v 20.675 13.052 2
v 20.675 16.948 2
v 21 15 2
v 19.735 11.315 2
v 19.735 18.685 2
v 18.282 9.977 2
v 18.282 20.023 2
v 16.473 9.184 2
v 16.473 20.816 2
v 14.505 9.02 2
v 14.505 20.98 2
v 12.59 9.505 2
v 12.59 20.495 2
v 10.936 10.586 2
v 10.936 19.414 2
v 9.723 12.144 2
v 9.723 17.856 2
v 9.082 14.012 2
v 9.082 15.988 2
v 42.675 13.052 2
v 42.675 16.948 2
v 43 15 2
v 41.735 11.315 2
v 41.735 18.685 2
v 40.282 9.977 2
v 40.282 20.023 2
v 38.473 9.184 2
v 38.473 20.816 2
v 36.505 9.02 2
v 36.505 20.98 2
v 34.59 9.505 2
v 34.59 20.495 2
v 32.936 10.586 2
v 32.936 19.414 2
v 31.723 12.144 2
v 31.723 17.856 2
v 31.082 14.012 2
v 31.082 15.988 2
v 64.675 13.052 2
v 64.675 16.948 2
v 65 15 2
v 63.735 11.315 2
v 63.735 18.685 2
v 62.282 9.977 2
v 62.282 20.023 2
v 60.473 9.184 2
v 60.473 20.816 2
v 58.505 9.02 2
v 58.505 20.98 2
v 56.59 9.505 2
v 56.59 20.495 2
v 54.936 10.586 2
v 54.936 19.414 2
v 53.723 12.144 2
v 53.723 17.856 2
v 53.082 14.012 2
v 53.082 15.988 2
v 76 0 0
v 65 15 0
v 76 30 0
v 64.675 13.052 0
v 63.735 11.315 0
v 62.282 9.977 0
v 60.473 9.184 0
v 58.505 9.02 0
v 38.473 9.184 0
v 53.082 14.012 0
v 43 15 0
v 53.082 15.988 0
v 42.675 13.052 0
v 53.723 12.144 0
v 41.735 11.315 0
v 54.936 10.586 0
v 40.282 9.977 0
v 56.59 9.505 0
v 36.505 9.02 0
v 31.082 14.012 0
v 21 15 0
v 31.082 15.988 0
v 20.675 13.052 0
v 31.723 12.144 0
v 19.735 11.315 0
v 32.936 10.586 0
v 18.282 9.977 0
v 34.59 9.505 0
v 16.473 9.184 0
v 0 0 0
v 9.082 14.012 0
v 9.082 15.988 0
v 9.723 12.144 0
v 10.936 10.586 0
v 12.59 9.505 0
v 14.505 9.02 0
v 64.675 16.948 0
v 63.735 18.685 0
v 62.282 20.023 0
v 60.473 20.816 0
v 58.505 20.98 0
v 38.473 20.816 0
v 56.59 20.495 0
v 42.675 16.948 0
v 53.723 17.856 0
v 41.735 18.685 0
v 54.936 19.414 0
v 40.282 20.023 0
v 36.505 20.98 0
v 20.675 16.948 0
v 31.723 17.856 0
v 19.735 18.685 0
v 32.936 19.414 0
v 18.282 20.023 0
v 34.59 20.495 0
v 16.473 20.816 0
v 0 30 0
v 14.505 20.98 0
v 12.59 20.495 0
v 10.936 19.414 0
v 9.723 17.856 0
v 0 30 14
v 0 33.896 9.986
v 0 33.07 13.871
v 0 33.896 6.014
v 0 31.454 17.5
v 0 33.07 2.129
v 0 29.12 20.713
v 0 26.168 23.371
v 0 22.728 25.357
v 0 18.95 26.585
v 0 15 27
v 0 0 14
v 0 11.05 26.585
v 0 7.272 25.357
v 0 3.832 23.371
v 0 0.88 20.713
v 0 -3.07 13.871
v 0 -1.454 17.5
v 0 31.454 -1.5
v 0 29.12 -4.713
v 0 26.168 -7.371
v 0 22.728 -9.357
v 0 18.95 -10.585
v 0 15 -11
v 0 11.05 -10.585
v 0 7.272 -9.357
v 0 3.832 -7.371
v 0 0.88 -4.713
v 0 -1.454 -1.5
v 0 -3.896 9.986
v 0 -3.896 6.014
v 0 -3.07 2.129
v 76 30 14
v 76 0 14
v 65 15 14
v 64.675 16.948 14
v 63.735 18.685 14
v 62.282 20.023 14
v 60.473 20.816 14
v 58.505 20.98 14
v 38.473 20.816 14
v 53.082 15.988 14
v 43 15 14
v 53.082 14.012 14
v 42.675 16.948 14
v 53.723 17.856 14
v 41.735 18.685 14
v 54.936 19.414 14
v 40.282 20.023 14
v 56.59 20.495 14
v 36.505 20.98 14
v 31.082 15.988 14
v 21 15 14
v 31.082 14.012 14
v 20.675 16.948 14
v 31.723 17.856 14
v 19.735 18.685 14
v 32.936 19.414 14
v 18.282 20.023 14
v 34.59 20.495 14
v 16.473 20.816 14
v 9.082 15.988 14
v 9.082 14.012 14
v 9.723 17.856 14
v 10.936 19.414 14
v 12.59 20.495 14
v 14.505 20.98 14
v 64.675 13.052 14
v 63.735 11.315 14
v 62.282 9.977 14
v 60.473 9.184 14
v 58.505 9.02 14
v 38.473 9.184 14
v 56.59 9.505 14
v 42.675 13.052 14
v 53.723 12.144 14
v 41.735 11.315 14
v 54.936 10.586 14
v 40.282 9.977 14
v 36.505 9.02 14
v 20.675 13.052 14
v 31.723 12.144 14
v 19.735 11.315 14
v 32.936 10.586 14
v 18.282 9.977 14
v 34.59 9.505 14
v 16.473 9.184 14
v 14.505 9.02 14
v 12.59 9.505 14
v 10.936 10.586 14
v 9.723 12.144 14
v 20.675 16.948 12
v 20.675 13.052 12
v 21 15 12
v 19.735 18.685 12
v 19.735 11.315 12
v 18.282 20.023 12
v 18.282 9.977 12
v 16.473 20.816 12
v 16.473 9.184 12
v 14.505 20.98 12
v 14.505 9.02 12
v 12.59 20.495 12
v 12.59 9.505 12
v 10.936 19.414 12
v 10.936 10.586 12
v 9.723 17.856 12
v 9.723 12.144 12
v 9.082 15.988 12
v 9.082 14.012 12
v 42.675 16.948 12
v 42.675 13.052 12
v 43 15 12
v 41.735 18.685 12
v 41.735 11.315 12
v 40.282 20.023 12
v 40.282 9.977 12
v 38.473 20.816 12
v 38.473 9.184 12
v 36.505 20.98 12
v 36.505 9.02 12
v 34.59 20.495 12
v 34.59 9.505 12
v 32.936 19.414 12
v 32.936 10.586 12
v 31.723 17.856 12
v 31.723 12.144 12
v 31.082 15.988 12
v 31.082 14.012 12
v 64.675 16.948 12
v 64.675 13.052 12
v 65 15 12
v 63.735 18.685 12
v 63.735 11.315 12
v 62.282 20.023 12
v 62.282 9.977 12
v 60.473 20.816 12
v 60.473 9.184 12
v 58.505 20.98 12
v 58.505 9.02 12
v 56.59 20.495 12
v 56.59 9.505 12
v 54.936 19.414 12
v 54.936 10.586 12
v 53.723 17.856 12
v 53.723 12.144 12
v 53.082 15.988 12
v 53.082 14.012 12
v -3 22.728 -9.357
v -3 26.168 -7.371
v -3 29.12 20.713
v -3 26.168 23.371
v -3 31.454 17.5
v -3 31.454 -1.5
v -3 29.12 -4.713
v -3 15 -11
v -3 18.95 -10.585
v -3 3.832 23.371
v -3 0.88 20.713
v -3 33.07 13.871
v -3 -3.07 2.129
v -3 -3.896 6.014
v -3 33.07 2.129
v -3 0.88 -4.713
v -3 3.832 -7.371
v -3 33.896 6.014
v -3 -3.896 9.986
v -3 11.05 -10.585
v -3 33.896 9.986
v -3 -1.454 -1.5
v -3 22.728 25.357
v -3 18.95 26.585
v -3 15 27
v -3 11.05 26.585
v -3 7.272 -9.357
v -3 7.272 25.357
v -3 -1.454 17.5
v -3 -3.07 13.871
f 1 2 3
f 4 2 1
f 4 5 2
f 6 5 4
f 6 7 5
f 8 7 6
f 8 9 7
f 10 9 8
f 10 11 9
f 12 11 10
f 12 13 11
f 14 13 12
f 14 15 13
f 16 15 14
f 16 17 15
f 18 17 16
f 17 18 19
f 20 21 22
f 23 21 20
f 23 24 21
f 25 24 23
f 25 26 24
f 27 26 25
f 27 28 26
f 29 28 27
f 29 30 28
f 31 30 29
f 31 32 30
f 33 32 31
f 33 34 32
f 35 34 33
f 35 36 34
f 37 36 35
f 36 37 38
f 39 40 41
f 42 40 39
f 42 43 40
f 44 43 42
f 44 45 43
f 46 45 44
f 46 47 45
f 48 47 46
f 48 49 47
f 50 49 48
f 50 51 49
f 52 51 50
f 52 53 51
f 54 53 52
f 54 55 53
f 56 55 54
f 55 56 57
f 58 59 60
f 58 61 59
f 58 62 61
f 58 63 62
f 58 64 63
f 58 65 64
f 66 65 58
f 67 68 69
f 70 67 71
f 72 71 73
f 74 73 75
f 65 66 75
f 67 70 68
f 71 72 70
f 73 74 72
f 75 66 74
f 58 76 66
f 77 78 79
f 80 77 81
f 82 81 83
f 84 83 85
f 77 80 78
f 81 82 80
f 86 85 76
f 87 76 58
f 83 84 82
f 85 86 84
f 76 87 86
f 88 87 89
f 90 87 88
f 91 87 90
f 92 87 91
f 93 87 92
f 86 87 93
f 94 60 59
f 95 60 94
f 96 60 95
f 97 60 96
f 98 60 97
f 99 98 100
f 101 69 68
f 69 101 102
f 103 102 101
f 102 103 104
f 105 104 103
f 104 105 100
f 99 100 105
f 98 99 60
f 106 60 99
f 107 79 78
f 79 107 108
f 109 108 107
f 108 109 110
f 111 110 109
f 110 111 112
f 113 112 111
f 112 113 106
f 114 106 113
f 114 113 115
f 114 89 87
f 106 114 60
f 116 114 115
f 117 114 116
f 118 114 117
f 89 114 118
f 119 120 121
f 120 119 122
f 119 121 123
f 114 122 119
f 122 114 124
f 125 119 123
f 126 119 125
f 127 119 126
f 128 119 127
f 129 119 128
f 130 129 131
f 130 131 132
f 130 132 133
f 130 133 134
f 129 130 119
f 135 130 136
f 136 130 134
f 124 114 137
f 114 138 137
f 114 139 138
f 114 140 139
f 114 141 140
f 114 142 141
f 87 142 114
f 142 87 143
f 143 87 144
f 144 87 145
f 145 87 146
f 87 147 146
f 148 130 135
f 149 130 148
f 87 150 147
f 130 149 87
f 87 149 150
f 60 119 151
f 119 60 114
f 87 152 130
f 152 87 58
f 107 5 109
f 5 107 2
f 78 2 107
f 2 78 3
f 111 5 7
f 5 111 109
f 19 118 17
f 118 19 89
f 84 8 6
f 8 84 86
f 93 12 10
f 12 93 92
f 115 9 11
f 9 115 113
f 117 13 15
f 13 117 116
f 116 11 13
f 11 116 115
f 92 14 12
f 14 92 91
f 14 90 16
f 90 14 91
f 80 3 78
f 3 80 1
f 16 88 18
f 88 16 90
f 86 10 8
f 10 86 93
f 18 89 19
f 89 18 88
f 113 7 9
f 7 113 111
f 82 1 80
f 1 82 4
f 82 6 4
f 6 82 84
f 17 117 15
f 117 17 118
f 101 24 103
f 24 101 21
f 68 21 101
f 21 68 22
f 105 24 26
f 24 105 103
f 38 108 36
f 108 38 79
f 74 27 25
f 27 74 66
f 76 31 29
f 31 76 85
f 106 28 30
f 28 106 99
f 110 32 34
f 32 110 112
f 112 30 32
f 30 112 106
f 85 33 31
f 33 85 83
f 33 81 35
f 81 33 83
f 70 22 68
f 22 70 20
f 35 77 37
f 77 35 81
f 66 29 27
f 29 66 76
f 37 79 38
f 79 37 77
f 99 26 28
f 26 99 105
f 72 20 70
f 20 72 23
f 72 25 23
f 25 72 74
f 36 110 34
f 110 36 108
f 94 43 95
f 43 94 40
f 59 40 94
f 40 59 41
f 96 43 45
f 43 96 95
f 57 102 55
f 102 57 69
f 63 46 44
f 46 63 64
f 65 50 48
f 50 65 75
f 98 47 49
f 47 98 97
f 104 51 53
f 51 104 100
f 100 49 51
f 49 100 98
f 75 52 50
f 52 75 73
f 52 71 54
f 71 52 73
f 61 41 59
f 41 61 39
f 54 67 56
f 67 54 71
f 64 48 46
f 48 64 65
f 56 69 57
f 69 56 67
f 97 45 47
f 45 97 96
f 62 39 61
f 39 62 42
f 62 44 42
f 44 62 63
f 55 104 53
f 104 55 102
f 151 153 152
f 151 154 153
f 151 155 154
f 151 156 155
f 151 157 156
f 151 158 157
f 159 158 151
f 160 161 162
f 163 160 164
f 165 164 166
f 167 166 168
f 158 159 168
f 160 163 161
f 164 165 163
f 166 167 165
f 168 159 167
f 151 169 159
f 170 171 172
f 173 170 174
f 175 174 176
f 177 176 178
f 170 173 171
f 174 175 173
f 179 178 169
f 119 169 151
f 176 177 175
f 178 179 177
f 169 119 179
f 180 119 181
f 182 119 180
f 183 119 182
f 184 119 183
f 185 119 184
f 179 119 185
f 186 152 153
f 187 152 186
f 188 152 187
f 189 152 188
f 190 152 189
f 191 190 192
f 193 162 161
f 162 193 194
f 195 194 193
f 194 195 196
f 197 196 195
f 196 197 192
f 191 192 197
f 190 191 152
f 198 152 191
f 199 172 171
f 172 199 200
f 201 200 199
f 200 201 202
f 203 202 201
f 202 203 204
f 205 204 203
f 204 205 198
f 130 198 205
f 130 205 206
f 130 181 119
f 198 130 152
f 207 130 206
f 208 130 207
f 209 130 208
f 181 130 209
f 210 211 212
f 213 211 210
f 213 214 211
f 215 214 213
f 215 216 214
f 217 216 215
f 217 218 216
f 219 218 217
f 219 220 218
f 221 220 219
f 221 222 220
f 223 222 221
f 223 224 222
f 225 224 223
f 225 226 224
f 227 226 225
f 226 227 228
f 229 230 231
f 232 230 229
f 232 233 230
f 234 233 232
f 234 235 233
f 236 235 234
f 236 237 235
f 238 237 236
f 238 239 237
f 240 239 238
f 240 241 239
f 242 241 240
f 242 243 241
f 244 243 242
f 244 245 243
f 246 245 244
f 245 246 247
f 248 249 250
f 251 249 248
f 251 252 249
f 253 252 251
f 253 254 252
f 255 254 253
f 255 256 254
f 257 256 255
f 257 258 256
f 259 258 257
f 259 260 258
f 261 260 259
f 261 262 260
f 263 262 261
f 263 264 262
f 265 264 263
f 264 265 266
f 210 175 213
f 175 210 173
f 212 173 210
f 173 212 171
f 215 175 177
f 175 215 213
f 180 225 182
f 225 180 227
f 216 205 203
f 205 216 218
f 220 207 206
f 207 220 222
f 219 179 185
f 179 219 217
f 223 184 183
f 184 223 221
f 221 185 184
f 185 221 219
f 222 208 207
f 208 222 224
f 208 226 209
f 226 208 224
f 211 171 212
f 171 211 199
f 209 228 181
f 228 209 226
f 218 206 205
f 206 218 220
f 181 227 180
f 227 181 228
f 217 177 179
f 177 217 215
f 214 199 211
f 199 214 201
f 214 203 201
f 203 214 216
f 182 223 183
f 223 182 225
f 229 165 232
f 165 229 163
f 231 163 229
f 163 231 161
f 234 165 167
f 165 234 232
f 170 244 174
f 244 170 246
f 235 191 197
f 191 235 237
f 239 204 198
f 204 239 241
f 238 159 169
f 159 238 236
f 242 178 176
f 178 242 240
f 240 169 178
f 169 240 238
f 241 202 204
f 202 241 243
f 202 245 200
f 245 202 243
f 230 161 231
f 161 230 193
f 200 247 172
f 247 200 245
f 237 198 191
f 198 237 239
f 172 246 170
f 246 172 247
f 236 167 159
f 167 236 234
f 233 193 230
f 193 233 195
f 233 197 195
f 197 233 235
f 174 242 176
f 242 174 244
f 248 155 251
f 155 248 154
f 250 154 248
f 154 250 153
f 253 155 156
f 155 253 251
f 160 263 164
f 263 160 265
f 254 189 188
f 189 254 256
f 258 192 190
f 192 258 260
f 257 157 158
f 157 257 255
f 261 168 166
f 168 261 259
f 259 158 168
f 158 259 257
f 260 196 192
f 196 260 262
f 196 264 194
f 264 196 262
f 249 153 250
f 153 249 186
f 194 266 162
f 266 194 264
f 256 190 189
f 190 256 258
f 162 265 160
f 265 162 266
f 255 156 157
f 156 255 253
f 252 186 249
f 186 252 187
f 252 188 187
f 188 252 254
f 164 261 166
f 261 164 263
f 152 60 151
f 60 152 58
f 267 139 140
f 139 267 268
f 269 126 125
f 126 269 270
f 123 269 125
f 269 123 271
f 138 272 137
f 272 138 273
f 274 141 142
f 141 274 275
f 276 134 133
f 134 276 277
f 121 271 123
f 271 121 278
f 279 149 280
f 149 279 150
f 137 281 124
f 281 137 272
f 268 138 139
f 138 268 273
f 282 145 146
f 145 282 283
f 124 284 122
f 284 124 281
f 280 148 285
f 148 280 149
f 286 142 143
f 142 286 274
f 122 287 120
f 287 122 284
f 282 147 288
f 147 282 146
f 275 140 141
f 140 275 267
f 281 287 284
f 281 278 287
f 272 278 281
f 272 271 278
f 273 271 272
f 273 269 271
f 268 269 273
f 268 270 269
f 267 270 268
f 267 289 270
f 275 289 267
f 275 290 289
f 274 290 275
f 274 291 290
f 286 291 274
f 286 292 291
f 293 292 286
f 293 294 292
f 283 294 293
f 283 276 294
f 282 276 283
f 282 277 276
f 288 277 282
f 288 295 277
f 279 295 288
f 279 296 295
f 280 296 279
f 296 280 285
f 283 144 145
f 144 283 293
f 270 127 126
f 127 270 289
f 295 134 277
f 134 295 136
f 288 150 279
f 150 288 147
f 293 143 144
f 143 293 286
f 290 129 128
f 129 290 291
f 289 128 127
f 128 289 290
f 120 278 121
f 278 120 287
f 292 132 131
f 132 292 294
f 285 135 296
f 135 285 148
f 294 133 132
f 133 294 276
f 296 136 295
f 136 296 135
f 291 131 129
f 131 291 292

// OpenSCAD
hole_radius = 6;
hole_diameter = hole_radius*2;
hole_distance = 10;
acrylic_thickness = 2;
foam_thickness = 10;
screwhole_radius = 2;
edge_distance = 5 + screwhole_radius * 2;
num_holes = 3;
ts_length = hole_diameter*num_holes + edge_distance*2 + hole_distance* (num_holes - 1);
ts_width = 2*edge_distance + hole_diameter;
rod_radius = 2;
gap = 10;
rod_length = 10;
motor_length = 36;
motor_width = 35;
motor_height = 35;
shaft_length = 22;
shaft_diam = 5;
prettify = 1;

module tubestrip(zpos=0) {
    translate([0,0,zpos]) difference () {
    cube([
        ts_length,
        ts_width,
        acrylic_thickness]);
    translate([hole_radius + edge_distance,
        hole_radius + edge_distance,
        -prettify]) cylinder(acrylic_thickness + 2*prettify, hole_radius, hole_radius, false); 
    translate([hole_radius + edge_distance + (hole_radius*2+hole_distance) * 1,
        hole_radius + edge_distance,
        -prettify]) cylinder(acrylic_thickness + 2*prettify, hole_radius, hole_radius, false); 
    translate([hole_radius + edge_distance + (hole_radius*2+hole_distance) * 2,
        hole_radius + edge_distance,
        -prettify]) cylinder(acrylic_thickness + 2*prettify, hole_radius, hole_radius, false);  
    }
}

color("white", alpha=0.5) tubestrip(zpos=0);
color("white", alpha=0.5) tubestrip(zpos=acrylic_thickness+foam_thickness);

// end plate for the two tube strips
color("white", alpha=0.5) translate([ts_length,0,0]) cube([acrylic_thickness, ts_width, foam_thickness+2*acrylic_thickness]);

// foam strip

color("black") translate([0, 0, acrylic_thickness]) cube([ts_length, ts_width,foam_thickness]);


// circular mounting plate for aluminum motor mount
backplate_radius = ts_width/2 + 4;
color("white") rotate([0, 90, 0]) translate([-(2*3+foam_thickness)/2, ts_width/2,-3]) cylinder(3, backplate_radius, backplate_radius, false);
